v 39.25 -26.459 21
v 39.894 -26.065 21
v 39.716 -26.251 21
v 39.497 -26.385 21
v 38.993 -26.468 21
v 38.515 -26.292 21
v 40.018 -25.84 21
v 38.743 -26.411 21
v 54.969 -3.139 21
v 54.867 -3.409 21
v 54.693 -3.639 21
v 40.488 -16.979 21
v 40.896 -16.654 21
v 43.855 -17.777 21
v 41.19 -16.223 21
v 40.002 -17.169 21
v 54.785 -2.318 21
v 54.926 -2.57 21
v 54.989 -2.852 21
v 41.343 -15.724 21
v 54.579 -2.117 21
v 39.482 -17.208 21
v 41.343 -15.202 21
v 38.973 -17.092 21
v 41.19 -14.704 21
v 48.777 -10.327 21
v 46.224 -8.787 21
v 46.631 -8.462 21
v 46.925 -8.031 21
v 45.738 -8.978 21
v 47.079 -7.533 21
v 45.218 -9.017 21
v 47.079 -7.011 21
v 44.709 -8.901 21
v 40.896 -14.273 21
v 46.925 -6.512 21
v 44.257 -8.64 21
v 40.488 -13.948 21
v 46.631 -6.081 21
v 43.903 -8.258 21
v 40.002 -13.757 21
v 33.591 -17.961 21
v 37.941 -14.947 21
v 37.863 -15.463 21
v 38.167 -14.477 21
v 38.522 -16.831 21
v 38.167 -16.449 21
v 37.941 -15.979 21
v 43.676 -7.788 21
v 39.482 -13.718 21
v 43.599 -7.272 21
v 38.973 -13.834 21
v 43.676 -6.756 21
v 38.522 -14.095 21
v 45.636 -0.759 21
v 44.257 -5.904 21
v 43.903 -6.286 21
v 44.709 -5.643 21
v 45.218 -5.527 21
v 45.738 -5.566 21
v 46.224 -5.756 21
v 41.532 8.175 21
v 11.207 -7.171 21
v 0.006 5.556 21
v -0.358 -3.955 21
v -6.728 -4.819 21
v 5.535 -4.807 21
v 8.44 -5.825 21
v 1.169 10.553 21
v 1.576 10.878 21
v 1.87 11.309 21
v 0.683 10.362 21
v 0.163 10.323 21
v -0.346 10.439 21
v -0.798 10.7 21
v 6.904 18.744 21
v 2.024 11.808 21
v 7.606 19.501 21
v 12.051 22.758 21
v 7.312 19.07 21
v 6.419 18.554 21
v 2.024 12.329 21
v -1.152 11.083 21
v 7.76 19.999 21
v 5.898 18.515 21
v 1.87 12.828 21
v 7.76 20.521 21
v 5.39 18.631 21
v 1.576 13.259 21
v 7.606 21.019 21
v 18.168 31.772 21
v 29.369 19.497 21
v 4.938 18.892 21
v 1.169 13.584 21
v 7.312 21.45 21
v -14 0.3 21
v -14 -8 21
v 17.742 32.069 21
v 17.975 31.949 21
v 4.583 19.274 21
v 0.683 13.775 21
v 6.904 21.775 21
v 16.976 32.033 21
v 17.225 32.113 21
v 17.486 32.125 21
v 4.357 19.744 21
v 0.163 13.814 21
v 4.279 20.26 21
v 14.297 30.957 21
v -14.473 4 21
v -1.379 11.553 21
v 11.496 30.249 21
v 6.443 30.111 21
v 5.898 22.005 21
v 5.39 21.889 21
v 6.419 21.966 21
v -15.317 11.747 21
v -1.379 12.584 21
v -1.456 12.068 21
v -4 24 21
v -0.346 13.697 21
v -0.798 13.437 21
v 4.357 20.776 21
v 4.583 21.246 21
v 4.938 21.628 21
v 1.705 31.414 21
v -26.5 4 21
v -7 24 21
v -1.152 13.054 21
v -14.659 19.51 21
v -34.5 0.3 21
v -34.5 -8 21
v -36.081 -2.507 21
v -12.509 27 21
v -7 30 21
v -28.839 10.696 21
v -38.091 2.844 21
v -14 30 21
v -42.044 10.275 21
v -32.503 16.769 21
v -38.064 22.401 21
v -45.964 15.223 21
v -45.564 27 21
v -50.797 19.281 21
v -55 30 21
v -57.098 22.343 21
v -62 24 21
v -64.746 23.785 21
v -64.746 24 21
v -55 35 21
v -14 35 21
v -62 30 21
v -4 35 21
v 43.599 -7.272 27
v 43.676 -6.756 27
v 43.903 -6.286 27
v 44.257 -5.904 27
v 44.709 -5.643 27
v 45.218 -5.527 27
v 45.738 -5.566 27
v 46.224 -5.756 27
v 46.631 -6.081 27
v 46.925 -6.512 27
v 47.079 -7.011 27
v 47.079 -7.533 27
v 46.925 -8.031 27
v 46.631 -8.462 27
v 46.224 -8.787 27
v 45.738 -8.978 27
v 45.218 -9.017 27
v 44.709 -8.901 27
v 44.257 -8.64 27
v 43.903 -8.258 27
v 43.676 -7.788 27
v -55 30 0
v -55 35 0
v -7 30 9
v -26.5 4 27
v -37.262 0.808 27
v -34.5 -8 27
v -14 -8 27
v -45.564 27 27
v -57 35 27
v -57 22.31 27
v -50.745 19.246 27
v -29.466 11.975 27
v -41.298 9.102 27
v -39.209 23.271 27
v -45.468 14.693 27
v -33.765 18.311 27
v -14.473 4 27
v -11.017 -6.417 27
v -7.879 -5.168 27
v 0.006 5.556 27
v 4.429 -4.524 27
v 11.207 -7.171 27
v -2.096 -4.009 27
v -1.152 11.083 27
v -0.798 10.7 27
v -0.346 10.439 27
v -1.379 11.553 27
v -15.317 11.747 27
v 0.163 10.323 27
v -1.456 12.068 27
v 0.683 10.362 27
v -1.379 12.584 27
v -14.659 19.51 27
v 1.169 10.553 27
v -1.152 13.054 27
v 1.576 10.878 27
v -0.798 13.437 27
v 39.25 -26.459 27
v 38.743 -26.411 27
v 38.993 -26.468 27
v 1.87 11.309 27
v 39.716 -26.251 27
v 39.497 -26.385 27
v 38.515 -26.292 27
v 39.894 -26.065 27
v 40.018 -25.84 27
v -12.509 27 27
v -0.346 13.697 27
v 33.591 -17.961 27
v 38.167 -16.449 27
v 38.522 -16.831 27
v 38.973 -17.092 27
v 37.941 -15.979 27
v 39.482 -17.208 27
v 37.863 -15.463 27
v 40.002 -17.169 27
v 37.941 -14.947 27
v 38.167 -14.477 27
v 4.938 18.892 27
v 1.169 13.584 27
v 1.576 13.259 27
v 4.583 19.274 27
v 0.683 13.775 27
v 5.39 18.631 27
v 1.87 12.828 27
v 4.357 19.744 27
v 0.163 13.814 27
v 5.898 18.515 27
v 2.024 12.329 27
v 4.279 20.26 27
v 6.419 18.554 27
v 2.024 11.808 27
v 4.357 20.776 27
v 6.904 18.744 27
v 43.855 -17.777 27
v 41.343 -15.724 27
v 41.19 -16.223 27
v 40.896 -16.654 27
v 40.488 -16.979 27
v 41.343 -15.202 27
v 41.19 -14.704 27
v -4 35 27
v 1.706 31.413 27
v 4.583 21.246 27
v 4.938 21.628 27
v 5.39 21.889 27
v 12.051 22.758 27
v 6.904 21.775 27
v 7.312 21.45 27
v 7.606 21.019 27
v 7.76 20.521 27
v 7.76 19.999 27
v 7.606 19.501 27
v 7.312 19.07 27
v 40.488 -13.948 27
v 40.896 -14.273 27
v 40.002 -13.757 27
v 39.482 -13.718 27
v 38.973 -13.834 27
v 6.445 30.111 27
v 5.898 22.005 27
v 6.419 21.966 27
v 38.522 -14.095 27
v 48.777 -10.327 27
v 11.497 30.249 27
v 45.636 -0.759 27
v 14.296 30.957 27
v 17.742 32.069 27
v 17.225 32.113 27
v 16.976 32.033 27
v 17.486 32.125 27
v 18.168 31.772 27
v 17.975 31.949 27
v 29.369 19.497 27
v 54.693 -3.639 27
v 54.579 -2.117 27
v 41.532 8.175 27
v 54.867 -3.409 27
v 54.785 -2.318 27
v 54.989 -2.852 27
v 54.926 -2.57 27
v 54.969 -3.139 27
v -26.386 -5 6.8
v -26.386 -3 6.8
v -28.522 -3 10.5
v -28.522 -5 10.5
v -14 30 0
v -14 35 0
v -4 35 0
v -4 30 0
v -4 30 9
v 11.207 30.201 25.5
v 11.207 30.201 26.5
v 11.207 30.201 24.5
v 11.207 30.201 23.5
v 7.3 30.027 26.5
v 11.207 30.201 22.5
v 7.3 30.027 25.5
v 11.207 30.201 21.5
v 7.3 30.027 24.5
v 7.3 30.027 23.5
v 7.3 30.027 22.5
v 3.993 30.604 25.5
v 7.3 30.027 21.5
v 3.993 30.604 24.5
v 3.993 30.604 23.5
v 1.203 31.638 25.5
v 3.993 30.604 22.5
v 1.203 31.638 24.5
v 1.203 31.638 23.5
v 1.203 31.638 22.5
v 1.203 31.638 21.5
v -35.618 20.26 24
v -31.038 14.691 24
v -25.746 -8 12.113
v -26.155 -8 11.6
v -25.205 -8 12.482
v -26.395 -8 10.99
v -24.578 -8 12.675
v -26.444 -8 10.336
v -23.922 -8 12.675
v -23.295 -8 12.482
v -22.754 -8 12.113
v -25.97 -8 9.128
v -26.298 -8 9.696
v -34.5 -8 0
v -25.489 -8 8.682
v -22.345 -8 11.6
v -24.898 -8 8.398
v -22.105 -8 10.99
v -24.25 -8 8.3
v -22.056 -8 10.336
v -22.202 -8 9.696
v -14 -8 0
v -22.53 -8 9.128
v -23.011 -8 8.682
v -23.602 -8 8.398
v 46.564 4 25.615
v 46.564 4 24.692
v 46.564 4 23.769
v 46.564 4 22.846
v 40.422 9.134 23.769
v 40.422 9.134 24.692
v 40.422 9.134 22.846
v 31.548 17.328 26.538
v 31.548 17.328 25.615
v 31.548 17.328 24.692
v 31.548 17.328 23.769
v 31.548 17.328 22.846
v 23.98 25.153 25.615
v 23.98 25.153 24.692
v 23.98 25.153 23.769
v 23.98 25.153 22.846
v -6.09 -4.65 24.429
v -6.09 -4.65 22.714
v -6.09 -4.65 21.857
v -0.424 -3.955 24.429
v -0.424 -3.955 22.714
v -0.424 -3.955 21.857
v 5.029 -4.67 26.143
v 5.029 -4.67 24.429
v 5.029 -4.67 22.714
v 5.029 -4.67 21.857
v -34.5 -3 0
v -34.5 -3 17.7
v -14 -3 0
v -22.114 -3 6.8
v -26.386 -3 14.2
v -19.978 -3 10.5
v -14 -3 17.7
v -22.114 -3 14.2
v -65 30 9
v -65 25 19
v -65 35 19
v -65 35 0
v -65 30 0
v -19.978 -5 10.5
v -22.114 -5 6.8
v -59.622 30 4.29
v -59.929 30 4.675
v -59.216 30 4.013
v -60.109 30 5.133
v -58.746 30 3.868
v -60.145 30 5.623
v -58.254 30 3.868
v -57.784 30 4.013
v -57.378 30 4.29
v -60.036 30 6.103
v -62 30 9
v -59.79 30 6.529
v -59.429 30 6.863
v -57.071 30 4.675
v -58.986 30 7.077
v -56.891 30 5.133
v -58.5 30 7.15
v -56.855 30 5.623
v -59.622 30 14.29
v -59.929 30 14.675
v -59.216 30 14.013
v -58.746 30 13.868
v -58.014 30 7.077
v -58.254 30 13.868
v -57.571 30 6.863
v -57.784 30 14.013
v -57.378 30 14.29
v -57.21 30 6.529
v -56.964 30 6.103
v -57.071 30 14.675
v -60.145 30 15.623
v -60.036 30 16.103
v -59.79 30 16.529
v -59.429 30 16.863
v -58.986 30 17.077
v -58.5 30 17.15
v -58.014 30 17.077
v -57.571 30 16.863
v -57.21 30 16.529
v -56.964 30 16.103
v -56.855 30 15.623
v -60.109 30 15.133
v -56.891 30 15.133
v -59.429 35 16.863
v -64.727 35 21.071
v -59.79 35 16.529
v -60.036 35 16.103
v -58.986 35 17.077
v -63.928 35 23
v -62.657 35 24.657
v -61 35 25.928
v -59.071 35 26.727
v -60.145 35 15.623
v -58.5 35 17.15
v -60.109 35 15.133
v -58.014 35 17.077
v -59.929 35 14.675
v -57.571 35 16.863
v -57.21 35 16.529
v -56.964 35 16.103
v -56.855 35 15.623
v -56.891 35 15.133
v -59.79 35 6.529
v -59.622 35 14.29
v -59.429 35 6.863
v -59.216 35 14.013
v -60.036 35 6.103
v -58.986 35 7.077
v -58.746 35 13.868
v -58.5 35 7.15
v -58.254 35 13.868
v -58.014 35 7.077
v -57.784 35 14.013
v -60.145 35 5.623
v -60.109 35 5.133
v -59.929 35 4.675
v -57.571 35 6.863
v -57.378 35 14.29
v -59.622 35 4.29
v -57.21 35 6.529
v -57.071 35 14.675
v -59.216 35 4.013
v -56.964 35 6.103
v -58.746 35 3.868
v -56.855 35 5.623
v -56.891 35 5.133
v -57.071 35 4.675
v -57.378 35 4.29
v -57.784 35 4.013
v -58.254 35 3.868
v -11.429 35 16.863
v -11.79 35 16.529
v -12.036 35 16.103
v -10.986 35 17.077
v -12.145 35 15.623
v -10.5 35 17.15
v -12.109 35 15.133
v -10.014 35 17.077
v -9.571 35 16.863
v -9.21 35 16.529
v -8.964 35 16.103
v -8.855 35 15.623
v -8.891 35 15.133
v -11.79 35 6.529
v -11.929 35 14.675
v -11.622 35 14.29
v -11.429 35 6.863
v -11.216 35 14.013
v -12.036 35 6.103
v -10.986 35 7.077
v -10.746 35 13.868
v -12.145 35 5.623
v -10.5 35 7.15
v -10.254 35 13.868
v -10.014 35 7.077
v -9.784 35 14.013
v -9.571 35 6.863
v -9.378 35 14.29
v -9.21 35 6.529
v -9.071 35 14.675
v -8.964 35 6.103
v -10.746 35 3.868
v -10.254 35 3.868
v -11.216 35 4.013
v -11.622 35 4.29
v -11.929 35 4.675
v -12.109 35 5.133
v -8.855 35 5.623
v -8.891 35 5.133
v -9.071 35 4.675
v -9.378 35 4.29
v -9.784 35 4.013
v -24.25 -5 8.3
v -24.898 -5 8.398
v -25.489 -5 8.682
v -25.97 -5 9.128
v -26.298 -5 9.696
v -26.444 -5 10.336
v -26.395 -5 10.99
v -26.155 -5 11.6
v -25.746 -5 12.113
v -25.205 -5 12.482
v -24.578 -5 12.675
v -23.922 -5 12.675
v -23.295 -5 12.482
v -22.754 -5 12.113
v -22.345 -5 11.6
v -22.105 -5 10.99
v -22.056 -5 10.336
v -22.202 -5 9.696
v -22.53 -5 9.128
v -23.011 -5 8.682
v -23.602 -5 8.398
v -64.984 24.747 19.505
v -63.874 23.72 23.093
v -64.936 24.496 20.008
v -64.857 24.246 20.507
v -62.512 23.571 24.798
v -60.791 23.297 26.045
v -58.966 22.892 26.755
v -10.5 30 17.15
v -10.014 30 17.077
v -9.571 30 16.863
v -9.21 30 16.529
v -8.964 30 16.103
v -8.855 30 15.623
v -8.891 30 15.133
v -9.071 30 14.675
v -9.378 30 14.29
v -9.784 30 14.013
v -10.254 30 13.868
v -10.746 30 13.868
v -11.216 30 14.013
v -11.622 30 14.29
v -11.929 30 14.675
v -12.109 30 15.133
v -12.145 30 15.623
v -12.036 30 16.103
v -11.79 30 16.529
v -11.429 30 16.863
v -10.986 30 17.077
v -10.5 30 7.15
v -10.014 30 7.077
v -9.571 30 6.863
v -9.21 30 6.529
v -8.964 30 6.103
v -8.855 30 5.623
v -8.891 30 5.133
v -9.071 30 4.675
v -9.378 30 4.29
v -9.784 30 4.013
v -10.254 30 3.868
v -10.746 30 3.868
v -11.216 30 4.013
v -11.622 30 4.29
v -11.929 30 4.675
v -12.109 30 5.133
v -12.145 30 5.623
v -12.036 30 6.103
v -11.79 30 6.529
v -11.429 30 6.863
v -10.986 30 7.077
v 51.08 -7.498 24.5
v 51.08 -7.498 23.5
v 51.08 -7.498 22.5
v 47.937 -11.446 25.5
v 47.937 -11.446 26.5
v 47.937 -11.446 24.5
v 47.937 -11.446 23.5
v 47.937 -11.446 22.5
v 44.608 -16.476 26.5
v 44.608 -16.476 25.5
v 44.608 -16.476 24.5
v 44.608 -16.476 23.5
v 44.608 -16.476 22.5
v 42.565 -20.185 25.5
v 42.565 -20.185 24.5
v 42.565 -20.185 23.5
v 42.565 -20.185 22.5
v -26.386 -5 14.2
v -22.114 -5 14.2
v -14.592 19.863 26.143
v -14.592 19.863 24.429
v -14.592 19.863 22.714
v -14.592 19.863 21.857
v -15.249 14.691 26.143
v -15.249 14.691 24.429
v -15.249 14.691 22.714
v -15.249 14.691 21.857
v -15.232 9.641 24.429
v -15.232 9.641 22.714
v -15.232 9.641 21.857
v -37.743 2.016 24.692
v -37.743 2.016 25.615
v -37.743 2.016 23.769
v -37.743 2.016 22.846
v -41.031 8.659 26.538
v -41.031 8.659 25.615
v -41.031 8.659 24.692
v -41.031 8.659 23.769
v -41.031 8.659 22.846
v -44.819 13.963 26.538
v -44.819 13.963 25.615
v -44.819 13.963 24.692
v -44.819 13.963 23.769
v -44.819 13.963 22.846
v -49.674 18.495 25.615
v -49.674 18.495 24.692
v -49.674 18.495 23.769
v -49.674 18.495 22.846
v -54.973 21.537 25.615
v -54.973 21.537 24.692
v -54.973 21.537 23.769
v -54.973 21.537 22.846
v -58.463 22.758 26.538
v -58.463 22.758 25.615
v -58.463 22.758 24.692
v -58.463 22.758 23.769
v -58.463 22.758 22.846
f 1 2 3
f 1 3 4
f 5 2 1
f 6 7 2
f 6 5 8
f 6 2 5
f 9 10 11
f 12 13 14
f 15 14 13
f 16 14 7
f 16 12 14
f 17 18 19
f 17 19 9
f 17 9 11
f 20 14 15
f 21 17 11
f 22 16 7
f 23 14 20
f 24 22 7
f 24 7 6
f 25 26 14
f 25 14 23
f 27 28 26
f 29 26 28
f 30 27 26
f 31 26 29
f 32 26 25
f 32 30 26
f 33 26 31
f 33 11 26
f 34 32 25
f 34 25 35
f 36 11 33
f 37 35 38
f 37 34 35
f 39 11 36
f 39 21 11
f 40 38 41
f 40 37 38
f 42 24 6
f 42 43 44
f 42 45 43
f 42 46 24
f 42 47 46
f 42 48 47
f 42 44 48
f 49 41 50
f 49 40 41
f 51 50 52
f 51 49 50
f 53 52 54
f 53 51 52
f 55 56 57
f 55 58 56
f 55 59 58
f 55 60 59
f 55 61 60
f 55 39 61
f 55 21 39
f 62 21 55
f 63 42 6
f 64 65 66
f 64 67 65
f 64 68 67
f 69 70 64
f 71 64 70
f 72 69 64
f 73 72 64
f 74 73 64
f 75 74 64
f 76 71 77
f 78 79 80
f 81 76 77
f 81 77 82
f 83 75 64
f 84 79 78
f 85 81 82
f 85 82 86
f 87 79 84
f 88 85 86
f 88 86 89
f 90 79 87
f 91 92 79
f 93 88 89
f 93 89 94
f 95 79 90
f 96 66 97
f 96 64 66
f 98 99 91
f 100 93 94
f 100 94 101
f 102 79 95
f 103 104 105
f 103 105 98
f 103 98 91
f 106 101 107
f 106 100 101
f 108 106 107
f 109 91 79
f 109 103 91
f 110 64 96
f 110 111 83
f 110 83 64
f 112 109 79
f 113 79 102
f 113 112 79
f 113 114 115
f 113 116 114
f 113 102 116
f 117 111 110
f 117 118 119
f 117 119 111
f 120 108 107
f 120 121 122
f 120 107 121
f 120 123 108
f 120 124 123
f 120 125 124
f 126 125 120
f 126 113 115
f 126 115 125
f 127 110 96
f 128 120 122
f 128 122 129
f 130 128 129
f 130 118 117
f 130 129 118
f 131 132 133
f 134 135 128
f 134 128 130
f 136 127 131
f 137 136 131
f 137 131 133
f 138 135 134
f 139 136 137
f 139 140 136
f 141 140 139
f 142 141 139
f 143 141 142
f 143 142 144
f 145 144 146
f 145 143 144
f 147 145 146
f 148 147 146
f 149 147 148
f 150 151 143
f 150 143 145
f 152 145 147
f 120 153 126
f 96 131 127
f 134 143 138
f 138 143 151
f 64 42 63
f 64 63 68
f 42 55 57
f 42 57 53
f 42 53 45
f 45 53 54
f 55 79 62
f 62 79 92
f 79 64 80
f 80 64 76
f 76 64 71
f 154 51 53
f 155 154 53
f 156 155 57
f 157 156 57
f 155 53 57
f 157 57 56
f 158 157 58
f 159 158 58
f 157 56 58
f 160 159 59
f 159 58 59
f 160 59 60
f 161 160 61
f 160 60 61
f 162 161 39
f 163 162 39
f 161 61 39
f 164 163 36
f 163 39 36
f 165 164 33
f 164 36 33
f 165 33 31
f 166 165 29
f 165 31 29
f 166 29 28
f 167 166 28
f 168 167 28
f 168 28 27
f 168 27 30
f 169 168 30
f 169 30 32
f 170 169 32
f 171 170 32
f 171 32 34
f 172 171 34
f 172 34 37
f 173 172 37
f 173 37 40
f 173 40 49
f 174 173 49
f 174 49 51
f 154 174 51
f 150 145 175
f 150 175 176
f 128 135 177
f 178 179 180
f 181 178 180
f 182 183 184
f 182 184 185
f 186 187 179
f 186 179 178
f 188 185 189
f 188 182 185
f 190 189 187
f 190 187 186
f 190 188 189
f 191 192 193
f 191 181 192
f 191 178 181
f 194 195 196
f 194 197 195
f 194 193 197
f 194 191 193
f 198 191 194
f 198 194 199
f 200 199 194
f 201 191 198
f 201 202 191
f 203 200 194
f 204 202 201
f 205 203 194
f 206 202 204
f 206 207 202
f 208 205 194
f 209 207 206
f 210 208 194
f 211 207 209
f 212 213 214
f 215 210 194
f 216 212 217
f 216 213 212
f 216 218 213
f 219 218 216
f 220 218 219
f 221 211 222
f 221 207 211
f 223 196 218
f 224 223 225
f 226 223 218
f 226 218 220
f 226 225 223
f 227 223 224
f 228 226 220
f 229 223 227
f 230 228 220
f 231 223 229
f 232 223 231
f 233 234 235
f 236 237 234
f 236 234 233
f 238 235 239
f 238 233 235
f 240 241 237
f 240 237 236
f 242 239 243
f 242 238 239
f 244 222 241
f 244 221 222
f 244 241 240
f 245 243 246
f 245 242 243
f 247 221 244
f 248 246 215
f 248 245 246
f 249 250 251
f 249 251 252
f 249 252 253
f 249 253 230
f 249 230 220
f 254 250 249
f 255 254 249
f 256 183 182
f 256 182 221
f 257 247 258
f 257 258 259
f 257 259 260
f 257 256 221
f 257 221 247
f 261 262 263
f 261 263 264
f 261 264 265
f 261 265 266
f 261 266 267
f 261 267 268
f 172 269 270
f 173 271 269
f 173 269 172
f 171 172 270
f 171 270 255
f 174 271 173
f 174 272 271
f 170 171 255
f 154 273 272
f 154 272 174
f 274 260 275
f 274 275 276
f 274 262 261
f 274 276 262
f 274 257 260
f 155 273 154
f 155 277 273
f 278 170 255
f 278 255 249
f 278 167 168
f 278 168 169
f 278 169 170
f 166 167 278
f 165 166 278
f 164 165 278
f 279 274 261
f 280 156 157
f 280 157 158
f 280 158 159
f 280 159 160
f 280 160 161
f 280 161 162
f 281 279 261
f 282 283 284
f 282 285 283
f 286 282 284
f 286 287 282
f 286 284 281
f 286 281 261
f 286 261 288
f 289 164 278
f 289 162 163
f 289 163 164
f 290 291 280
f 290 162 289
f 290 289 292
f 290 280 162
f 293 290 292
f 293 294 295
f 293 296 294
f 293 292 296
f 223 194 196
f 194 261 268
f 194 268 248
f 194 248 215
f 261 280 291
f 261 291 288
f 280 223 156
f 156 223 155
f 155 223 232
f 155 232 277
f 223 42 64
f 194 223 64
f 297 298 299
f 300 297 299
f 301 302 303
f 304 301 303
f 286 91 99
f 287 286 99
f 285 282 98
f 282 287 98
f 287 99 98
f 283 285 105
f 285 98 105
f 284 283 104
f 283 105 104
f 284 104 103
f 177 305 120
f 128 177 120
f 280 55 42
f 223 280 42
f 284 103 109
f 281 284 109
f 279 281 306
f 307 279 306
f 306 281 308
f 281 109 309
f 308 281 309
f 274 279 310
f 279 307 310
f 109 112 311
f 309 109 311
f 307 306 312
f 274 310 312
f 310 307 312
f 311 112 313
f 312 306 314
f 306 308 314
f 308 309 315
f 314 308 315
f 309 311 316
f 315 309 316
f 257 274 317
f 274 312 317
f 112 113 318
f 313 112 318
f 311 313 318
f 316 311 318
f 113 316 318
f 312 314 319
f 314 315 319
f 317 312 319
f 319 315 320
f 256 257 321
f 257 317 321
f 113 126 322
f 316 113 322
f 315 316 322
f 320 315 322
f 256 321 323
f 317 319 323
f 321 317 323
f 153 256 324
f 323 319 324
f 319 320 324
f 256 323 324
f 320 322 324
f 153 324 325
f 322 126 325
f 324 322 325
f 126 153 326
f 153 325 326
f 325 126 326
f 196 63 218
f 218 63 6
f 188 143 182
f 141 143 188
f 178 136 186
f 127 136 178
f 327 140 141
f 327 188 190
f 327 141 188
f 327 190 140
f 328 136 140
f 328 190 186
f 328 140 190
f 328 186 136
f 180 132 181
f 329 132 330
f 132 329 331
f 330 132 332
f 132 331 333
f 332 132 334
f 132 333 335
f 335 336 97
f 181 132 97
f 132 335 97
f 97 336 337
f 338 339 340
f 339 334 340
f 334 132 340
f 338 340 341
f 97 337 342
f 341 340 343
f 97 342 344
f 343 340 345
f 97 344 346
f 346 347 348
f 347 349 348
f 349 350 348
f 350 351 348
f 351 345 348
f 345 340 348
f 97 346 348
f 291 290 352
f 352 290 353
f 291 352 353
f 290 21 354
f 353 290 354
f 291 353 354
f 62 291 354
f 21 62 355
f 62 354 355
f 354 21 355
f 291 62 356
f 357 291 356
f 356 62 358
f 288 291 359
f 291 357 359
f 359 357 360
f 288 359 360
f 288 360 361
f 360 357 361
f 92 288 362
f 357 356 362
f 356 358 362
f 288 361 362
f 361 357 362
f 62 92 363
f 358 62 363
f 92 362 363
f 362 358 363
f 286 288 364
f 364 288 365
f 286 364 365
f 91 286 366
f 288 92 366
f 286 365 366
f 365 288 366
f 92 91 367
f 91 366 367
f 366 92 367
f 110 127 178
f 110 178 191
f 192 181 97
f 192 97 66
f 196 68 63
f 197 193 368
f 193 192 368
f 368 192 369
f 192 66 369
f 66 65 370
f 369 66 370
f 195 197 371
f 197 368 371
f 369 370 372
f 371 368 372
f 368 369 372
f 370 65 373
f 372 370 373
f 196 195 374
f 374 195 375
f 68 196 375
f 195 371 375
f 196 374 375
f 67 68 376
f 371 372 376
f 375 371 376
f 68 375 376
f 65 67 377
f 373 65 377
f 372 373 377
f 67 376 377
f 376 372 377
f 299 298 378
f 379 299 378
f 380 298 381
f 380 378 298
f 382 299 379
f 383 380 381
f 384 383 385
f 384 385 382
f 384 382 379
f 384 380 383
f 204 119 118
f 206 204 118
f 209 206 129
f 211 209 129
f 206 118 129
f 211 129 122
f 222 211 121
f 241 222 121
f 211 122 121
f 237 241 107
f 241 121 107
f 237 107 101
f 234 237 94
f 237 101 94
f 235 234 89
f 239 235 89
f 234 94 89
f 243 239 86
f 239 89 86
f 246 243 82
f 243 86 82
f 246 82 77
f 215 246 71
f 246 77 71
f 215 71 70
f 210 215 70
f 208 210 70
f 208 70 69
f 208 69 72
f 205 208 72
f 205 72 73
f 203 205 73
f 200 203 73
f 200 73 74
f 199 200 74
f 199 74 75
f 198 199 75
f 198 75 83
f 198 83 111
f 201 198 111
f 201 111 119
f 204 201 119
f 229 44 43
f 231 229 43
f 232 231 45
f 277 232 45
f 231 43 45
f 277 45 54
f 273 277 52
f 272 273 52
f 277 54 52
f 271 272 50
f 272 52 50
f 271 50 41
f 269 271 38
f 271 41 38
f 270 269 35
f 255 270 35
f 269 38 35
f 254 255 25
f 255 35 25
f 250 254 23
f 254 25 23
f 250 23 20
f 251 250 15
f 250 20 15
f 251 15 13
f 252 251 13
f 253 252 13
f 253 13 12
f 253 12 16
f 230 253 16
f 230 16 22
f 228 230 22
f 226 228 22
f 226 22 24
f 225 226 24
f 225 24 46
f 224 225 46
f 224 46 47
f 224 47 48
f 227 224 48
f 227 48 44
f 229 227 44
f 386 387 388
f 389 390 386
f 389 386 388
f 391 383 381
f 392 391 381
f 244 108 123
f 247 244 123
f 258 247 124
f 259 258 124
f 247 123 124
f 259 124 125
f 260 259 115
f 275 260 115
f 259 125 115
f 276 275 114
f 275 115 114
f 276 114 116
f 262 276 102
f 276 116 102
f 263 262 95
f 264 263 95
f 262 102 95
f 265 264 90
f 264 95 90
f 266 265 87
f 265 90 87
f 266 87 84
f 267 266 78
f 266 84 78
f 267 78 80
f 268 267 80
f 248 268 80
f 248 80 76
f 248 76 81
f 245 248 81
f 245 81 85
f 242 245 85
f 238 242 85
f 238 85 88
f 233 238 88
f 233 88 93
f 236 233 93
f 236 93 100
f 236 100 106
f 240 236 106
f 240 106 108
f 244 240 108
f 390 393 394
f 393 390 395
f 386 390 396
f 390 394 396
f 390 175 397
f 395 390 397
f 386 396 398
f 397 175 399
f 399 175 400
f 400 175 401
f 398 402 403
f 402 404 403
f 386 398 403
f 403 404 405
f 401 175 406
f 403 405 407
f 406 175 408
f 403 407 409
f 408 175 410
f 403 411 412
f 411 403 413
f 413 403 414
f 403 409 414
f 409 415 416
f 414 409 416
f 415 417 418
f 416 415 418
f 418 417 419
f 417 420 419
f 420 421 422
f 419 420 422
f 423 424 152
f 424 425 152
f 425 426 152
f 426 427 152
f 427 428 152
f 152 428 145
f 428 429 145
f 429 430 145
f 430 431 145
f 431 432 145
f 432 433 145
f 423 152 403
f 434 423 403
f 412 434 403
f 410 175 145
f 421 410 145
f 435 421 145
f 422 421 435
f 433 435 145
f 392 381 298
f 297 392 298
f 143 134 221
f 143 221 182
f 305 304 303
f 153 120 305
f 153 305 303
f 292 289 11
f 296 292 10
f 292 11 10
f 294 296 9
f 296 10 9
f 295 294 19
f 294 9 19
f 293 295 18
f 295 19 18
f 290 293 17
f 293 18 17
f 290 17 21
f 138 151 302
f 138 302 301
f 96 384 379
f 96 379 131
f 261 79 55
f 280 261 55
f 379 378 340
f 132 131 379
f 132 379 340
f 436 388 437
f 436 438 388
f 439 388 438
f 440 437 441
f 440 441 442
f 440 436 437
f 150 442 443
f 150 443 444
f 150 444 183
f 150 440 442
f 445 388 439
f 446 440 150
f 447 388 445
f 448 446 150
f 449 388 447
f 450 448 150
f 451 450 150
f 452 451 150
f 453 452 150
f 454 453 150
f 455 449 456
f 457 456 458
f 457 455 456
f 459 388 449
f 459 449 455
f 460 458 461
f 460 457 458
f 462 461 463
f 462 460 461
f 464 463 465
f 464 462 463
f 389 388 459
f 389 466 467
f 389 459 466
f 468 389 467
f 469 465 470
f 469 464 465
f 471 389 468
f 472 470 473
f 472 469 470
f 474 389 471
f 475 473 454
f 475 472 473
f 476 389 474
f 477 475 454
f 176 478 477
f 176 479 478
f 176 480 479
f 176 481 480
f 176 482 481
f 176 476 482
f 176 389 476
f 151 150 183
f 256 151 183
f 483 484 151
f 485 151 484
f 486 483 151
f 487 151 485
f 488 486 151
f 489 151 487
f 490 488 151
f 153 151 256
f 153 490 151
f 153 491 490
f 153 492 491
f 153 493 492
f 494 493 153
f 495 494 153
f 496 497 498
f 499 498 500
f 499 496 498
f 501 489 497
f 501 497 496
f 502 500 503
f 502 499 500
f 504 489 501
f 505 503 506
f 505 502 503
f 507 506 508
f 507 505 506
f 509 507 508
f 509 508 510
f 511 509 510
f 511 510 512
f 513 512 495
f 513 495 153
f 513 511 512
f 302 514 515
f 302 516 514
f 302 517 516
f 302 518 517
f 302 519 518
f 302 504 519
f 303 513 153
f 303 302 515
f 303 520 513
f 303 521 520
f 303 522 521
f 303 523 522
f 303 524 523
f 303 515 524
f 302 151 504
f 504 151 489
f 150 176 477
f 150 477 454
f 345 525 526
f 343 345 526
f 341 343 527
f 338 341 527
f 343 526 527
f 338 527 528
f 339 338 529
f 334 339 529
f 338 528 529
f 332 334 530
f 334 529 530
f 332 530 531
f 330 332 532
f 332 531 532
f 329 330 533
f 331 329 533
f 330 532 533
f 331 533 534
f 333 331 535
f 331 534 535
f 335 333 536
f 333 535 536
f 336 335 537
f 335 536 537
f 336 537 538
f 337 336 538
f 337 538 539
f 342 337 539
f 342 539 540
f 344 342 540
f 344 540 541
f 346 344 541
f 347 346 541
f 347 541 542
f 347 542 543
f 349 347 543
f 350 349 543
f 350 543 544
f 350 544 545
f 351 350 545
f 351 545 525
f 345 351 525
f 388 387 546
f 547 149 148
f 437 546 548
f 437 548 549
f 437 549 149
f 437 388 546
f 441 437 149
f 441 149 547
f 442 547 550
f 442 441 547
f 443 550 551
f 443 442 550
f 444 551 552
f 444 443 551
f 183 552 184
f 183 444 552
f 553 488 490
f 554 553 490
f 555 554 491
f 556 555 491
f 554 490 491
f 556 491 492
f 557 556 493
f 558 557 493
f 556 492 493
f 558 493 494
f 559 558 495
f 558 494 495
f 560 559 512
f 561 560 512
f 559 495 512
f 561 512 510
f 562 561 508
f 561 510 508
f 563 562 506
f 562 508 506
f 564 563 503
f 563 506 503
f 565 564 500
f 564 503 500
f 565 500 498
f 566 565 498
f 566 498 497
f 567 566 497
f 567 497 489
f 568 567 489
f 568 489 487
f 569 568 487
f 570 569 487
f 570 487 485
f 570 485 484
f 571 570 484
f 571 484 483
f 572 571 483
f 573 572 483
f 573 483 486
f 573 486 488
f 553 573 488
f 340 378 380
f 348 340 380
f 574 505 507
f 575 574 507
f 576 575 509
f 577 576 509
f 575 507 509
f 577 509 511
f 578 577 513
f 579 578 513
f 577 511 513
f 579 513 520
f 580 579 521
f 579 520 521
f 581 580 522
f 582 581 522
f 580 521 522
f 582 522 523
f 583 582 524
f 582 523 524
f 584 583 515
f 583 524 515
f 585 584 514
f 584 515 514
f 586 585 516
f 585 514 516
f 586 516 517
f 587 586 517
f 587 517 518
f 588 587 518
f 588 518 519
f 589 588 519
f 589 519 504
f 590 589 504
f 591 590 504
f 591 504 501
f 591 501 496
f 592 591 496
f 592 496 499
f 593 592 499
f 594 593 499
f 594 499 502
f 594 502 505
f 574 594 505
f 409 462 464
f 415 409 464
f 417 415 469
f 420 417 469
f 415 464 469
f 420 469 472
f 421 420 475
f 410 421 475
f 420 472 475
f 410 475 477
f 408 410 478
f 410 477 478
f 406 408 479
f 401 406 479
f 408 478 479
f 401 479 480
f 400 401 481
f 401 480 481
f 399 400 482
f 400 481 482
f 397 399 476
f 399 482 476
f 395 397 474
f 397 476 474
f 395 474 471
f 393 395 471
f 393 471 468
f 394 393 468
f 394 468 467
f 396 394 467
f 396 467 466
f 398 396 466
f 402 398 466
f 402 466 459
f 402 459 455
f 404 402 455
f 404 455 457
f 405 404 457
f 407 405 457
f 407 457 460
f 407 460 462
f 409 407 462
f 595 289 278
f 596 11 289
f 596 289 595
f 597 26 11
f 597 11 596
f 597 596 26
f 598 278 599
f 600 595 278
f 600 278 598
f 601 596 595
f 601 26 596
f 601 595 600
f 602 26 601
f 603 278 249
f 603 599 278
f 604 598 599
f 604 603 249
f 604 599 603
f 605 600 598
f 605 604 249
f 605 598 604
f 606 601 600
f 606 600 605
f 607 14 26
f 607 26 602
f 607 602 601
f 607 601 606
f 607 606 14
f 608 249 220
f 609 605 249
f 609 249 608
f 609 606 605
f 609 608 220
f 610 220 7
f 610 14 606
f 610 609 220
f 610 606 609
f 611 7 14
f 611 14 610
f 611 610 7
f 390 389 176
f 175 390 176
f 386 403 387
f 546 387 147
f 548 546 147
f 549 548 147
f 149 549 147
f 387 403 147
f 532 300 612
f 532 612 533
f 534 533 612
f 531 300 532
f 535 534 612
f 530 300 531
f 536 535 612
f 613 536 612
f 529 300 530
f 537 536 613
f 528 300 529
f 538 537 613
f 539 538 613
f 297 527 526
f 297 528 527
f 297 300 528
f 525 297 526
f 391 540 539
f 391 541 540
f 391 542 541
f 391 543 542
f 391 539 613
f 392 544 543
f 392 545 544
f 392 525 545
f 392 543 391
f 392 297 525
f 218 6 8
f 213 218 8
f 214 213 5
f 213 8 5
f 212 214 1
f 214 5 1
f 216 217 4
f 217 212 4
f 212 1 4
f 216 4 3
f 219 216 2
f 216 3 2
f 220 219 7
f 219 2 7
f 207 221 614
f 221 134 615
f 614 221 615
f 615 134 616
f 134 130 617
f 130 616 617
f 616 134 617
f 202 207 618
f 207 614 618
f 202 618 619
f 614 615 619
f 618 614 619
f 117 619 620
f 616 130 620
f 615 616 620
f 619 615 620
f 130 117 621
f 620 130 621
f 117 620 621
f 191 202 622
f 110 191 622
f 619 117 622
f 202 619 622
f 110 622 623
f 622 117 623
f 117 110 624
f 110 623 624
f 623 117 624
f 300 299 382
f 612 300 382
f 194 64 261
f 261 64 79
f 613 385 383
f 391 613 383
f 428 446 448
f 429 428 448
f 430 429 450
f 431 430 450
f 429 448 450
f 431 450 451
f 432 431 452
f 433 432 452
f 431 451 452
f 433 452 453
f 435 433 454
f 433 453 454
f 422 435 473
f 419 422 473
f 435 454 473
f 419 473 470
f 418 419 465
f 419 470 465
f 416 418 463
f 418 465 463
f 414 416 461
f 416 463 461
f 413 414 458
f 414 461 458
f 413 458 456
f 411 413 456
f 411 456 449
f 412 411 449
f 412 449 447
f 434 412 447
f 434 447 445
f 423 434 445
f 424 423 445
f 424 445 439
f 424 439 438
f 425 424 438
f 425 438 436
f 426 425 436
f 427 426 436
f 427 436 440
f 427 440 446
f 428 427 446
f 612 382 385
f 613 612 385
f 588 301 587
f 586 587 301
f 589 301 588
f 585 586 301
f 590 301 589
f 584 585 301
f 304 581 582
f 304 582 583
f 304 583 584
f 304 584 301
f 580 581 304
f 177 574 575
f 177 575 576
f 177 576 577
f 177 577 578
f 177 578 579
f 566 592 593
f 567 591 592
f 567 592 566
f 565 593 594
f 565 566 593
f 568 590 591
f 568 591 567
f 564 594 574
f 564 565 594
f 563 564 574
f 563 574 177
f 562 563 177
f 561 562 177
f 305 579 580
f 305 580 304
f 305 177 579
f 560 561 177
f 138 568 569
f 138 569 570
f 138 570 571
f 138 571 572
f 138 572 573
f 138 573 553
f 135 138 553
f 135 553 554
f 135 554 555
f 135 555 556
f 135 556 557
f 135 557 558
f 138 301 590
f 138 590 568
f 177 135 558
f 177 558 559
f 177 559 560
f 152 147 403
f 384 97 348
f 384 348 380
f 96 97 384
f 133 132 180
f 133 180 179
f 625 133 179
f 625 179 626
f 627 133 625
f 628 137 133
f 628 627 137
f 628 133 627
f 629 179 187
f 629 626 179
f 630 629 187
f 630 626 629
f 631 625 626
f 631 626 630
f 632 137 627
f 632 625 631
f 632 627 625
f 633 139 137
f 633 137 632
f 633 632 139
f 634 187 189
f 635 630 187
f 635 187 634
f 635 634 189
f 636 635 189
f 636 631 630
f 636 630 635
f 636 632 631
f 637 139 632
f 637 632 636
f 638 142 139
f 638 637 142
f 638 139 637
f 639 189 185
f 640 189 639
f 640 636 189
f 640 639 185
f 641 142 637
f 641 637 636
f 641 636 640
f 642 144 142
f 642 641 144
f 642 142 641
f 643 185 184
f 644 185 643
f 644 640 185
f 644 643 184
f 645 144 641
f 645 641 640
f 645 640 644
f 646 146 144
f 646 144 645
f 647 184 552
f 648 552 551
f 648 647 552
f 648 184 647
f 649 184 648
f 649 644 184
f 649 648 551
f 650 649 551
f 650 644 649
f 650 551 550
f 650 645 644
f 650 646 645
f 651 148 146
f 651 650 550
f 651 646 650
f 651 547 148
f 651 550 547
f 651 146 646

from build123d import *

# Parameters (mm, degrees)
SKETCH1_W               = 130
SKETCH1_H               = 70
BOSS_EXTRUDE1_DEPTH     = 27
SKETCH2_R               = 1.75
CUT_EXTRUDE1_DEPTH      = 79.606615498
CUT_EXTRUDE2_START      = -21
CUT_EXTRUDE2_OUTLINE_R  = 1.75
CUT_EXTRUDE2_DEPTH      = 21
CUT_EXTRUDE3_DEPTH      = 100.813505607
CUT_EXTRUDE3_DEPTH_BACK = 100.813505607
SKETCH5_R               = 1.65
SKETCH5_R_2             = 2.2
CUT_EXTRUDE4_DEPTH      = 94.44983135
CUT_EXTRUDE5_DEPTH      = 2
FILLET1_R               = 8


# Read off the part's stored shape, not the designer's step: Cut-Extrude2
with BuildPart() as part:
    # Sketch1 → Boss-Extrude1 (new body)
    with BuildSketch(Plane.XY):
        Rectangle(SKETCH1_W, SKETCH1_H)
    extrude(amount=BOSS_EXTRUDE1_DEPTH)

    # Sketch2 → Cut-Extrude1 (cut, through all)
    with BuildSketch(Plane(origin=(0, 0, 0), x_dir=(-1, 0, 0), z_dir=(0, 0, -1))):
        with BuildLine():
            add(Edge.make_bspline(
                [(14, -8), (12.412656523, -7.055676593), (9.829799179, -5.770272176), (6.165512557, -4.606713552), (3.277012022, -4.062959942), (0.564036018, -3.901535266), (-2.216713416, -4.070795733), (-6.222645376, -4.825329711), (-9.261142271, -6.092866446), (-11.207024466, -7.170674217)],
                knots=[0, 0, 0, 0, 0.208912226, 0.324847868, 0.433763925, 0.540513306, 0.631348632, 0.748251472, 1, 1, 1, 1], degree=3))
            Line((-11.207024466, -7.170674217), (-38.514642112, -26.291673943))
            ThreePointArc((-38.514642112, -26.291673943), (-39.375842934, -26.43026519), (-40.018197727, -25.840134095))
            add(Edge.make_bspline(
                [(-54.693432206, -3.639104104), (-54.000239817, -4.322176148), (-52.771901008, -5.586727304), (-51.191675368, -7.351333396), (-50.009383391, -8.761398854), (-48.960444962, -10.077193603), (-48.021966464, -11.318023658), (-46.929298413, -12.844883167), (-45.807480175, -14.514983511), (-44.698429074, -16.303801358), (-43.610061024, -18.190212069), (-42.623413939, -20.039778385), (-41.346245965, -22.653074903), (-40.526939035, -24.553048699), (-40.018197727, -25.840134095)],
                knots=[0, 0, 0, 0, 0.108901726, 0.197234234, 0.265009817, 0.314795349, 0.38552882, 0.439078637, 0.524888988, 0.610617011, 0.674554255, 0.76857808, 0.845134678, 1, 1, 1, 1], degree=3))
            ThreePointArc((-54.693432206, -3.639104104), (-54.988709395, -2.851622056), (-54.578672675, -2.11732887))
            add(Edge.make_bspline(
                [(-54.578672675, -2.11732887), (-52.904706158, -0.903188565), (-50.213471625, 1.1109576), (-46.620959917, 3.939887731), (-43.553861019, 6.447777415), (-40.876153765, 8.726535519), (-38.155516815, 11.122837462), (-35.877293384, 13.195237532), (-33.560975223, 15.373252509), (-31.589578869, 17.278645179), (-29.116728404, 19.73422006), (-26.589609741, 22.339446363), (-24.018869132, 25.098935859), (-21.319274087, 28.088310862), (-19.398072944, 30.309569394), (-18.167896158, 31.772237731)],
                knots=[0, 0, 0, 0, 0.124410707, 0.202203721, 0.275081929, 0.362753741, 0.41371947, 0.493193443, 0.548026308, 0.604997703, 0.658133266, 0.7576823, 0.823332152, 0.885019477, 1, 1, 1, 1], degree=3))
            ThreePointArc((-18.167896158, 31.772237731), (-17.616183173, 32.105495699), (-16.975732581, 32.032893158))
            add(Edge.make_bspline(
                [(-16.975732581, 32.032893158), (-16.07038591, 31.605615141), (-14.190483196, 30.84692344), (-11.432318602, 30.167487646), (-9.106305345, 29.956953669), (-7.247829325, 30.005761544), (-5.636150486, 30.202914826), (-4.104137993, 30.549932261), (-2.615674759, 31.028158171), (-1.384323931, 31.538183258), (-0.269738408, 32.090279064), (0.652828442, 32.606390757), (2.122584172, 33.524520801), (3.221931153, 34.350377975), (4, 35)],
                knots=[0, 0, 0, 0, 0.133264553, 0.269301018, 0.376459272, 0.443117385, 0.516465554, 0.592229051, 0.651846415, 0.724397358, 0.769397209, 0.81736137, 0.865051933, 1, 1, 1, 1], degree=3))
            Line((4, 35), (-65, 35))
            Line((-65, 35), (-65, -35))
            Line((-65, -35), (65, -35))
            Line((65, -35), (65, 23.8))
            add(Edge.make_bspline(
                [(34.5, -8), (35.043061412, -5.842802386), (36.023743001, -2.466653125), (37.707498645, 2.038626647), (39.250500058, 5.470378664), (40.910531254, 8.537294569), (42.727183517, 11.357919306), (44.656417758, 13.852387174), (46.976953716, 16.316608014), (49.498712998, 18.458196173), (52.259790918, 20.25141053), (55.197814462, 21.706116383), (58.058541869, 22.702999613), (61.418054191, 23.471660912), (63.619738318, 23.724829372), (65, 23.8)],
                knots=[0, 0, 0, 0, 0.140280558, 0.221445335, 0.303096868, 0.377342059, 0.441125059, 0.51446902, 0.575837651, 0.65428395, 0.722450724, 0.782920233, 0.860623982, 0.912822204, 1, 1, 1, 1], degree=3))
            Line((34.5, -8), (14, -8))
        make_face()
        Polygon((-33.591106657, -17.961078948), (-0.005872841, 5.555554943), (-12.050978004, 22.757747873), (-45.63621182, -0.758886018), align=None)
        with Locations((-45.348573575, -7.271739788)):
            Circle(SKETCH2_R)
        with Locations((-39.612809212, -15.463260231)):
            Circle(SKETCH2_R)
        with Locations((-0.293511086, 12.068408714)):
            Circle(SKETCH2_R)
        with Locations((-6.029275449, 20.259929156)):
            Circle(SKETCH2_R)
        with BuildLine():
            add(Edge.make_bspline(
                [(45.563538233, 27), (43.389199875, 25.977901541), (39.886025201, 23.963630926), (36.000760835, 20.736612979), (33.23904056, 17.802043425), (30.912235406, 14.67678007), (28.353826133, 10.034151363), (27.08111073, 6.339222762), (26.5, 4)],
                knots=[0, 0, 0, 0, 0.232992533, 0.389790585, 0.487746096, 0.623149509, 0.766347799, 1, 1, 1, 1], degree=3))
            Line((26.5, 4), (14.472989206, 4))
            add(Edge.make_bspline(
                [(12.50850871, 27), (13.090671786, 25.509563557), (13.866518923, 23.147635977), (14.582812232, 20.03122413), (15.015130042, 17.446221031), (15.274561682, 14.843030618), (15.347261596, 12.133178471), (15.216584761, 8.550820577), (14.849227023, 5.860770346), (14.472989206, 4)],
                knots=[0, 0, 0, 0, 0.205082191, 0.318017932, 0.409516878, 0.540841365, 0.652931948, 0.756700096, 1, 1, 1, 1], degree=3))
            Line((12.50850871, 27), (45.563538233, 27))
        make_face()
    extrude(amount=-CUT_EXTRUDE1_DEPTH, mode=Mode.SUBTRACT)

    # Cut-Extrude2 outline → Cut-Extrude2 (cut)
    with BuildSketch(Plane(origin=(0, 0, 0), x_dir=(-1, 0, 0), z_dir=(0, 0, -1)).offset(CUT_EXTRUDE2_START)):
        with BuildLine():
            Line((7, 24), (4, 24))
            Line((4, 24), (4, 35))
            add(Edge.make_bspline(
                [(4, 35), (3.221931153, 34.350377975), (2.122584172, 33.524520801), (0.652828442, 32.606390757), (-0.269738408, 32.090279064), (-1.384323931, 31.538183258), (-2.615674759, 31.028158171), (-4.104137993, 30.549932261), (-5.636150486, 30.202914826), (-7.247829325, 30.005761544), (-9.106305345, 29.956953669), (-11.432318602, 30.167487646), (-14.190483196, 30.84692344), (-16.07038591, 31.605615141), (-16.975732581, 32.032893158)],
                knots=[2.0985e-05, 2.0985e-05, 2.0985e-05, 2.0985e-05, 0.134969052, 0.182659615, 0.230623776, 0.275623627, 0.34817457, 0.407791934, 0.483555431, 0.5569036, 0.623561713, 0.730719967, 0.866756432, 1.000020985, 1.000020985, 1.000020985, 1.000020985], degree=3))
            ThreePointArc((-16.975732581, 32.032893158), (-17.616183174, 32.105495699), (-18.167896158, 31.772237731))
            add(Edge.make_bspline(
                [(-54.578672675, -2.11732887), (-52.904706158, -0.903188565), (-50.213471625, 1.1109576), (-46.620959917, 3.939887731), (-43.553861019, 6.447777415), (-40.876153765, 8.726535519), (-38.155516815, 11.122837462), (-35.877293384, 13.195237532), (-33.560975223, 15.373252509), (-31.589578869, 17.278645179), (-29.116728404, 19.73422006), (-26.589609741, 22.339446363), (-24.018869132, 25.098935859), (-21.319274087, 28.088310862), (-19.398072944, 30.309569394), (-18.167896158, 31.772237731)],
                knots=[0, 0, 0, 0, 0.124410707, 0.202203721, 0.275081929, 0.362753741, 0.41371947, 0.493193443, 0.548026308, 0.604997703, 0.658133266, 0.7576823, 0.823332152, 0.885019477, 1, 1, 1, 1], degree=3))
            ThreePointArc((-54.578672675, -2.11732887), (-54.988709395, -2.851622056), (-54.693432206, -3.639104104))
            add(Edge.make_bspline(
                [(-54.693432206, -3.639104104), (-54.000239817, -4.322176148), (-52.771901008, -5.586727304), (-51.191675368, -7.351333396), (-50.009383391, -8.761398854), (-48.960444962, -10.077193603), (-48.021966464, -11.318023658), (-46.929298413, -12.844883167), (-45.807480175, -14.514983511), (-44.698429074, -16.303801358), (-43.610061024, -18.190212069), (-42.623413939, -20.039778385), (-41.346245965, -22.653074903), (-40.526939035, -24.553048699), (-40.018197727, -25.840134095)],
                knots=[0, 0, 0, 0, 0.108901726, 0.197234234, 0.265009817, 0.314795349, 0.38552882, 0.439078637, 0.524888988, 0.610617011, 0.674554255, 0.76857808, 0.845134678, 1, 1, 1, 1], degree=3))
            ThreePointArc((-40.018197727, -25.840134095), (-39.375842934, -26.43026519), (-38.514642112, -26.291673943))
            Line((-38.514642112, -26.291673943), (-11.207024466, -7.170674217))
            add(Edge.make_bspline(
                [(14, -8), (12.412656523, -7.055676593), (9.829799179, -5.770272176), (6.165512557, -4.606713552), (3.277012022, -4.062959942), (0.564036018, -3.901535266), (-2.216713416, -4.070795733), (-6.222645376, -4.825329711), (-9.261142271, -6.092866446), (-11.207024466, -7.170674217)],
                knots=[0, 0, 0, 0, 0.208912226, 0.324847868, 0.433763925, 0.540513306, 0.631348632, 0.748251472, 1, 1, 1, 1], degree=3))
            Line((14, -8), (14, 0.3))
            Line((14, 0.3), (34.5, 0.3))
            Line((34.5, 0.3), (34.5, -8))
            add(Edge.make_bspline(
                [(34.5, -8), (35.043061412, -5.842802386), (36.023743001, -2.466653125), (37.707498645, 2.038626647), (39.250500058, 5.470378664), (40.910531254, 8.537294569), (42.727183517, 11.357919306), (44.656417758, 13.852387174), (46.976953716, 16.316608014), (49.498712998, 18.458196173), (52.259790918, 20.25141053), (55.197814462, 21.706116383), (58.058541869, 22.702999613), (61.418054191, 23.471660912), (63.619738318, 23.724829372), (65, 23.8)],
                knots=[0, 0, 0, 0, 0.140280558, 0.221445335, 0.303096868, 0.377342059, 0.441125059, 0.51446902, 0.575837651, 0.65428395, 0.722450724, 0.782920233, 0.860623982, 0.912822204, 1, 1, 1, 1], degree=3))
            Line((65, 23.8), (65, 24))
            Line((65, 24), (62, 24))
            Line((62, 24), (62, 30))
            Line((62, 30), (55, 30))
            Line((55, 30), (55, 35))
            Line((55, 35), (14, 35))
            Line((14, 35), (14, 30))
            Line((14, 30), (7, 30))
            Line((7, 30), (7, 24))
        make_face()
        with Locations((-39.612809212, -15.463260231)):
            Circle(CUT_EXTRUDE2_OUTLINE_R, mode=Mode.SUBTRACT)
        with Locations((-45.348573575, -7.271739788)):
            Circle(CUT_EXTRUDE2_OUTLINE_R, mode=Mode.SUBTRACT)
        Polygon((-0.005872841, 5.555554943), (-33.591106657, -17.961078948), (-45.63621182, -0.758886018), (-12.050978004, 22.757747873), align=None, mode=Mode.SUBTRACT)
        with Locations((-0.293511086, 12.068408714)):
            Circle(CUT_EXTRUDE2_OUTLINE_R, mode=Mode.SUBTRACT)
        with Locations((-6.029275449, 20.259929156)):
            Circle(CUT_EXTRUDE2_OUTLINE_R, mode=Mode.SUBTRACT)
        with BuildLine():
            Line((12.50850871, 27), (45.563538233, 27))
            add(Edge.make_bspline(
                [(45.563538233, 27), (43.389199875, 25.977901541), (39.886025201, 23.963630926), (36.000760835, 20.736612979), (33.23904056, 17.802043425), (30.912235406, 14.67678007), (28.353826133, 10.034151363), (27.08111073, 6.339222762), (26.5, 4)],
                knots=[0, 0, 0, 0, 0.232992533, 0.389790585, 0.487746096, 0.623149509, 0.766347799, 1, 1, 1, 1], degree=3))
            Line((26.5, 4), (14.472989206, 4))
            add(Edge.make_bspline(
                [(12.50850871, 27), (13.090671786, 25.509563557), (13.866518923, 23.147635977), (14.582812232, 20.03122413), (15.015130042, 17.446221031), (15.274561682, 14.843030618), (15.347261596, 12.133178471), (15.216584761, 8.550820577), (14.849227023, 5.860770346), (14.472989206, 4)],
                knots=[0, 0, 0, 0, 0.205082191, 0.318017932, 0.409516878, 0.540841365, 0.652931948, 0.756700096, 1, 1, 1, 1], degree=3))
        make_face(mode=Mode.SUBTRACT)
    extrude(amount=CUT_EXTRUDE2_DEPTH, mode=Mode.SUBTRACT)

    # Sketch4 → Cut-Extrude3 (cut, two sides: drawn at the far end of the back side and taken through both)
    with BuildSketch(Plane.ZY.offset(34.5).offset(-CUT_EXTRUDE3_DEPTH_BACK)):
        Polygon((0, 24), (0, 30), (9, 30), (21, 24), align=None)
        Polygon((0, 0.3), (0, -3), (17.7, -3), (21, 0.3), align=None)
    extrude(amount=CUT_EXTRUDE3_DEPTH + CUT_EXTRUDE3_DEPTH_BACK, mode=Mode.SUBTRACT)

    # Sketch5 → Cut-Extrude4 (cut, through all)
    with BuildSketch(Plane(origin=(0, 35, 0), x_dir=(1, 0, 0), z_dir=(0, 1, 0))):
        with Locations(Location((-10.5, -5.5, 0), (0, 0, 270))):
            Circle(SKETCH5_R)
        with Locations(Location((-10.5, -15.5, 0), (0, 0, 270))):
            Circle(SKETCH5_R)
        with Locations(Location((-58.5, -15.5, 0), (0, 0, 270))):
            Circle(SKETCH5_R)
        with Locations(Location((-58.5, -5.5, 0), (0, 0, 270))):
            Circle(SKETCH5_R)
        with Locations(Location((-24.25, -10.5, 0), (0, 0, 90))):
            Circle(SKETCH5_R_2)
    extrude(amount=-CUT_EXTRUDE4_DEPTH, mode=Mode.SUBTRACT)

    # Sketch6 → Cut-Extrude5 (cut)
    with BuildSketch(Plane(origin=(0, -3, 0), x_dir=(1, 0, 0), z_dir=(0, 1, 0))):
        Polygon((-19.977608008, -10.5), (-22.113804004, -6.8), (-26.386195996, -6.8), (-28.522391992, -10.5), (-26.386195996, -14.2), (-22.113804004, -14.2), align=None)
    extrude(amount=-CUT_EXTRUDE5_DEPTH, mode=Mode.SUBTRACT)

    # Fillet1
    fillet1_edges = [part.edges().sort_by_distance(p)[0] for p in [
        (-65, 29.4, 27),
    ]]
    fillet(fillet1_edges, radius=FILLET1_R)


solid = part.part
